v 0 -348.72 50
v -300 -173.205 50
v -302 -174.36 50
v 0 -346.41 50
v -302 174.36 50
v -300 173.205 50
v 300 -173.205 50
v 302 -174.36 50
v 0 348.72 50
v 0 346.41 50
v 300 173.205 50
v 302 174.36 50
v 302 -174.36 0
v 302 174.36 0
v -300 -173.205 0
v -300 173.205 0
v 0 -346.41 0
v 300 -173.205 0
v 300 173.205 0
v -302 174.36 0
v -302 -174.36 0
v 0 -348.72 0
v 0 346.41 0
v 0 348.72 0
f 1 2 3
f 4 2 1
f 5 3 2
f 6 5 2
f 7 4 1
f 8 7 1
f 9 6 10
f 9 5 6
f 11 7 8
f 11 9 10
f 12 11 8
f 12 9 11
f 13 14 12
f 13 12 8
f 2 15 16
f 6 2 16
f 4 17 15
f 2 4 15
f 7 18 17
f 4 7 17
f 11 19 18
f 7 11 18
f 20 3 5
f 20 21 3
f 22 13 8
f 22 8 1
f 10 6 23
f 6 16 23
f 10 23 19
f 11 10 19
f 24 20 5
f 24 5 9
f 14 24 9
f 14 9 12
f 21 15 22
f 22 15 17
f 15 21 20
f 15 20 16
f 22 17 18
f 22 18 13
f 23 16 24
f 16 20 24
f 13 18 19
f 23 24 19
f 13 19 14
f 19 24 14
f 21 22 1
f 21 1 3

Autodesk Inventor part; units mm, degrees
ref_plane "YZ Plane" through (0, 0, 0) normal (1, 0, 0) x (0, 1, 0)
ref_plane "XZ Plane" through (0, 0, 0) normal (0, 1, 0) x (-1, 0, 0)
ref_plane "Work Plane1" through (0, 0, 0) normal (0, 0, 1) x (1, 0, 0)
sketch "Sketch1" plane through (0, 0, 0) normal (0, 0, 1) x (1, 0, 0)
  line L0 (300, -173.2051) -> (0, -346.4102)
  line L1 (0, -346.4102) -> (-300, -173.2051)
  line L2 (-300, -173.2051) -> (-300, 173.2051)
  line L3 (-300, 173.2051) -> (0, 346.4102)
  line L4 (0, 346.4102) -> (300, 173.2051)
  line L5 (300, 173.2051) -> (300, -173.2051)
  line L6 (302, 174.3598) -> (302, -174.3598)
  line L7 (302, -174.3598) -> (0, -348.7196)
  line L8 (0, -348.7196) -> (-302, -174.3598)
  line L9 (-302, -174.3598) -> (-302, 174.3598)
  line L10 (-302, 174.3598) -> (0, 348.7196)
  line L11 (0, 348.7196) -> (302, 174.3598)
  point P0 (0, 0)
  point P1 (0, 0)
  point P2 (0, 0)
  dimension "d0" = 302
  dimension "d1" = 300
extrude "Extrusion1" add sketch "Sketch1" along normal blind 50
properties part number "Wallmesh"
